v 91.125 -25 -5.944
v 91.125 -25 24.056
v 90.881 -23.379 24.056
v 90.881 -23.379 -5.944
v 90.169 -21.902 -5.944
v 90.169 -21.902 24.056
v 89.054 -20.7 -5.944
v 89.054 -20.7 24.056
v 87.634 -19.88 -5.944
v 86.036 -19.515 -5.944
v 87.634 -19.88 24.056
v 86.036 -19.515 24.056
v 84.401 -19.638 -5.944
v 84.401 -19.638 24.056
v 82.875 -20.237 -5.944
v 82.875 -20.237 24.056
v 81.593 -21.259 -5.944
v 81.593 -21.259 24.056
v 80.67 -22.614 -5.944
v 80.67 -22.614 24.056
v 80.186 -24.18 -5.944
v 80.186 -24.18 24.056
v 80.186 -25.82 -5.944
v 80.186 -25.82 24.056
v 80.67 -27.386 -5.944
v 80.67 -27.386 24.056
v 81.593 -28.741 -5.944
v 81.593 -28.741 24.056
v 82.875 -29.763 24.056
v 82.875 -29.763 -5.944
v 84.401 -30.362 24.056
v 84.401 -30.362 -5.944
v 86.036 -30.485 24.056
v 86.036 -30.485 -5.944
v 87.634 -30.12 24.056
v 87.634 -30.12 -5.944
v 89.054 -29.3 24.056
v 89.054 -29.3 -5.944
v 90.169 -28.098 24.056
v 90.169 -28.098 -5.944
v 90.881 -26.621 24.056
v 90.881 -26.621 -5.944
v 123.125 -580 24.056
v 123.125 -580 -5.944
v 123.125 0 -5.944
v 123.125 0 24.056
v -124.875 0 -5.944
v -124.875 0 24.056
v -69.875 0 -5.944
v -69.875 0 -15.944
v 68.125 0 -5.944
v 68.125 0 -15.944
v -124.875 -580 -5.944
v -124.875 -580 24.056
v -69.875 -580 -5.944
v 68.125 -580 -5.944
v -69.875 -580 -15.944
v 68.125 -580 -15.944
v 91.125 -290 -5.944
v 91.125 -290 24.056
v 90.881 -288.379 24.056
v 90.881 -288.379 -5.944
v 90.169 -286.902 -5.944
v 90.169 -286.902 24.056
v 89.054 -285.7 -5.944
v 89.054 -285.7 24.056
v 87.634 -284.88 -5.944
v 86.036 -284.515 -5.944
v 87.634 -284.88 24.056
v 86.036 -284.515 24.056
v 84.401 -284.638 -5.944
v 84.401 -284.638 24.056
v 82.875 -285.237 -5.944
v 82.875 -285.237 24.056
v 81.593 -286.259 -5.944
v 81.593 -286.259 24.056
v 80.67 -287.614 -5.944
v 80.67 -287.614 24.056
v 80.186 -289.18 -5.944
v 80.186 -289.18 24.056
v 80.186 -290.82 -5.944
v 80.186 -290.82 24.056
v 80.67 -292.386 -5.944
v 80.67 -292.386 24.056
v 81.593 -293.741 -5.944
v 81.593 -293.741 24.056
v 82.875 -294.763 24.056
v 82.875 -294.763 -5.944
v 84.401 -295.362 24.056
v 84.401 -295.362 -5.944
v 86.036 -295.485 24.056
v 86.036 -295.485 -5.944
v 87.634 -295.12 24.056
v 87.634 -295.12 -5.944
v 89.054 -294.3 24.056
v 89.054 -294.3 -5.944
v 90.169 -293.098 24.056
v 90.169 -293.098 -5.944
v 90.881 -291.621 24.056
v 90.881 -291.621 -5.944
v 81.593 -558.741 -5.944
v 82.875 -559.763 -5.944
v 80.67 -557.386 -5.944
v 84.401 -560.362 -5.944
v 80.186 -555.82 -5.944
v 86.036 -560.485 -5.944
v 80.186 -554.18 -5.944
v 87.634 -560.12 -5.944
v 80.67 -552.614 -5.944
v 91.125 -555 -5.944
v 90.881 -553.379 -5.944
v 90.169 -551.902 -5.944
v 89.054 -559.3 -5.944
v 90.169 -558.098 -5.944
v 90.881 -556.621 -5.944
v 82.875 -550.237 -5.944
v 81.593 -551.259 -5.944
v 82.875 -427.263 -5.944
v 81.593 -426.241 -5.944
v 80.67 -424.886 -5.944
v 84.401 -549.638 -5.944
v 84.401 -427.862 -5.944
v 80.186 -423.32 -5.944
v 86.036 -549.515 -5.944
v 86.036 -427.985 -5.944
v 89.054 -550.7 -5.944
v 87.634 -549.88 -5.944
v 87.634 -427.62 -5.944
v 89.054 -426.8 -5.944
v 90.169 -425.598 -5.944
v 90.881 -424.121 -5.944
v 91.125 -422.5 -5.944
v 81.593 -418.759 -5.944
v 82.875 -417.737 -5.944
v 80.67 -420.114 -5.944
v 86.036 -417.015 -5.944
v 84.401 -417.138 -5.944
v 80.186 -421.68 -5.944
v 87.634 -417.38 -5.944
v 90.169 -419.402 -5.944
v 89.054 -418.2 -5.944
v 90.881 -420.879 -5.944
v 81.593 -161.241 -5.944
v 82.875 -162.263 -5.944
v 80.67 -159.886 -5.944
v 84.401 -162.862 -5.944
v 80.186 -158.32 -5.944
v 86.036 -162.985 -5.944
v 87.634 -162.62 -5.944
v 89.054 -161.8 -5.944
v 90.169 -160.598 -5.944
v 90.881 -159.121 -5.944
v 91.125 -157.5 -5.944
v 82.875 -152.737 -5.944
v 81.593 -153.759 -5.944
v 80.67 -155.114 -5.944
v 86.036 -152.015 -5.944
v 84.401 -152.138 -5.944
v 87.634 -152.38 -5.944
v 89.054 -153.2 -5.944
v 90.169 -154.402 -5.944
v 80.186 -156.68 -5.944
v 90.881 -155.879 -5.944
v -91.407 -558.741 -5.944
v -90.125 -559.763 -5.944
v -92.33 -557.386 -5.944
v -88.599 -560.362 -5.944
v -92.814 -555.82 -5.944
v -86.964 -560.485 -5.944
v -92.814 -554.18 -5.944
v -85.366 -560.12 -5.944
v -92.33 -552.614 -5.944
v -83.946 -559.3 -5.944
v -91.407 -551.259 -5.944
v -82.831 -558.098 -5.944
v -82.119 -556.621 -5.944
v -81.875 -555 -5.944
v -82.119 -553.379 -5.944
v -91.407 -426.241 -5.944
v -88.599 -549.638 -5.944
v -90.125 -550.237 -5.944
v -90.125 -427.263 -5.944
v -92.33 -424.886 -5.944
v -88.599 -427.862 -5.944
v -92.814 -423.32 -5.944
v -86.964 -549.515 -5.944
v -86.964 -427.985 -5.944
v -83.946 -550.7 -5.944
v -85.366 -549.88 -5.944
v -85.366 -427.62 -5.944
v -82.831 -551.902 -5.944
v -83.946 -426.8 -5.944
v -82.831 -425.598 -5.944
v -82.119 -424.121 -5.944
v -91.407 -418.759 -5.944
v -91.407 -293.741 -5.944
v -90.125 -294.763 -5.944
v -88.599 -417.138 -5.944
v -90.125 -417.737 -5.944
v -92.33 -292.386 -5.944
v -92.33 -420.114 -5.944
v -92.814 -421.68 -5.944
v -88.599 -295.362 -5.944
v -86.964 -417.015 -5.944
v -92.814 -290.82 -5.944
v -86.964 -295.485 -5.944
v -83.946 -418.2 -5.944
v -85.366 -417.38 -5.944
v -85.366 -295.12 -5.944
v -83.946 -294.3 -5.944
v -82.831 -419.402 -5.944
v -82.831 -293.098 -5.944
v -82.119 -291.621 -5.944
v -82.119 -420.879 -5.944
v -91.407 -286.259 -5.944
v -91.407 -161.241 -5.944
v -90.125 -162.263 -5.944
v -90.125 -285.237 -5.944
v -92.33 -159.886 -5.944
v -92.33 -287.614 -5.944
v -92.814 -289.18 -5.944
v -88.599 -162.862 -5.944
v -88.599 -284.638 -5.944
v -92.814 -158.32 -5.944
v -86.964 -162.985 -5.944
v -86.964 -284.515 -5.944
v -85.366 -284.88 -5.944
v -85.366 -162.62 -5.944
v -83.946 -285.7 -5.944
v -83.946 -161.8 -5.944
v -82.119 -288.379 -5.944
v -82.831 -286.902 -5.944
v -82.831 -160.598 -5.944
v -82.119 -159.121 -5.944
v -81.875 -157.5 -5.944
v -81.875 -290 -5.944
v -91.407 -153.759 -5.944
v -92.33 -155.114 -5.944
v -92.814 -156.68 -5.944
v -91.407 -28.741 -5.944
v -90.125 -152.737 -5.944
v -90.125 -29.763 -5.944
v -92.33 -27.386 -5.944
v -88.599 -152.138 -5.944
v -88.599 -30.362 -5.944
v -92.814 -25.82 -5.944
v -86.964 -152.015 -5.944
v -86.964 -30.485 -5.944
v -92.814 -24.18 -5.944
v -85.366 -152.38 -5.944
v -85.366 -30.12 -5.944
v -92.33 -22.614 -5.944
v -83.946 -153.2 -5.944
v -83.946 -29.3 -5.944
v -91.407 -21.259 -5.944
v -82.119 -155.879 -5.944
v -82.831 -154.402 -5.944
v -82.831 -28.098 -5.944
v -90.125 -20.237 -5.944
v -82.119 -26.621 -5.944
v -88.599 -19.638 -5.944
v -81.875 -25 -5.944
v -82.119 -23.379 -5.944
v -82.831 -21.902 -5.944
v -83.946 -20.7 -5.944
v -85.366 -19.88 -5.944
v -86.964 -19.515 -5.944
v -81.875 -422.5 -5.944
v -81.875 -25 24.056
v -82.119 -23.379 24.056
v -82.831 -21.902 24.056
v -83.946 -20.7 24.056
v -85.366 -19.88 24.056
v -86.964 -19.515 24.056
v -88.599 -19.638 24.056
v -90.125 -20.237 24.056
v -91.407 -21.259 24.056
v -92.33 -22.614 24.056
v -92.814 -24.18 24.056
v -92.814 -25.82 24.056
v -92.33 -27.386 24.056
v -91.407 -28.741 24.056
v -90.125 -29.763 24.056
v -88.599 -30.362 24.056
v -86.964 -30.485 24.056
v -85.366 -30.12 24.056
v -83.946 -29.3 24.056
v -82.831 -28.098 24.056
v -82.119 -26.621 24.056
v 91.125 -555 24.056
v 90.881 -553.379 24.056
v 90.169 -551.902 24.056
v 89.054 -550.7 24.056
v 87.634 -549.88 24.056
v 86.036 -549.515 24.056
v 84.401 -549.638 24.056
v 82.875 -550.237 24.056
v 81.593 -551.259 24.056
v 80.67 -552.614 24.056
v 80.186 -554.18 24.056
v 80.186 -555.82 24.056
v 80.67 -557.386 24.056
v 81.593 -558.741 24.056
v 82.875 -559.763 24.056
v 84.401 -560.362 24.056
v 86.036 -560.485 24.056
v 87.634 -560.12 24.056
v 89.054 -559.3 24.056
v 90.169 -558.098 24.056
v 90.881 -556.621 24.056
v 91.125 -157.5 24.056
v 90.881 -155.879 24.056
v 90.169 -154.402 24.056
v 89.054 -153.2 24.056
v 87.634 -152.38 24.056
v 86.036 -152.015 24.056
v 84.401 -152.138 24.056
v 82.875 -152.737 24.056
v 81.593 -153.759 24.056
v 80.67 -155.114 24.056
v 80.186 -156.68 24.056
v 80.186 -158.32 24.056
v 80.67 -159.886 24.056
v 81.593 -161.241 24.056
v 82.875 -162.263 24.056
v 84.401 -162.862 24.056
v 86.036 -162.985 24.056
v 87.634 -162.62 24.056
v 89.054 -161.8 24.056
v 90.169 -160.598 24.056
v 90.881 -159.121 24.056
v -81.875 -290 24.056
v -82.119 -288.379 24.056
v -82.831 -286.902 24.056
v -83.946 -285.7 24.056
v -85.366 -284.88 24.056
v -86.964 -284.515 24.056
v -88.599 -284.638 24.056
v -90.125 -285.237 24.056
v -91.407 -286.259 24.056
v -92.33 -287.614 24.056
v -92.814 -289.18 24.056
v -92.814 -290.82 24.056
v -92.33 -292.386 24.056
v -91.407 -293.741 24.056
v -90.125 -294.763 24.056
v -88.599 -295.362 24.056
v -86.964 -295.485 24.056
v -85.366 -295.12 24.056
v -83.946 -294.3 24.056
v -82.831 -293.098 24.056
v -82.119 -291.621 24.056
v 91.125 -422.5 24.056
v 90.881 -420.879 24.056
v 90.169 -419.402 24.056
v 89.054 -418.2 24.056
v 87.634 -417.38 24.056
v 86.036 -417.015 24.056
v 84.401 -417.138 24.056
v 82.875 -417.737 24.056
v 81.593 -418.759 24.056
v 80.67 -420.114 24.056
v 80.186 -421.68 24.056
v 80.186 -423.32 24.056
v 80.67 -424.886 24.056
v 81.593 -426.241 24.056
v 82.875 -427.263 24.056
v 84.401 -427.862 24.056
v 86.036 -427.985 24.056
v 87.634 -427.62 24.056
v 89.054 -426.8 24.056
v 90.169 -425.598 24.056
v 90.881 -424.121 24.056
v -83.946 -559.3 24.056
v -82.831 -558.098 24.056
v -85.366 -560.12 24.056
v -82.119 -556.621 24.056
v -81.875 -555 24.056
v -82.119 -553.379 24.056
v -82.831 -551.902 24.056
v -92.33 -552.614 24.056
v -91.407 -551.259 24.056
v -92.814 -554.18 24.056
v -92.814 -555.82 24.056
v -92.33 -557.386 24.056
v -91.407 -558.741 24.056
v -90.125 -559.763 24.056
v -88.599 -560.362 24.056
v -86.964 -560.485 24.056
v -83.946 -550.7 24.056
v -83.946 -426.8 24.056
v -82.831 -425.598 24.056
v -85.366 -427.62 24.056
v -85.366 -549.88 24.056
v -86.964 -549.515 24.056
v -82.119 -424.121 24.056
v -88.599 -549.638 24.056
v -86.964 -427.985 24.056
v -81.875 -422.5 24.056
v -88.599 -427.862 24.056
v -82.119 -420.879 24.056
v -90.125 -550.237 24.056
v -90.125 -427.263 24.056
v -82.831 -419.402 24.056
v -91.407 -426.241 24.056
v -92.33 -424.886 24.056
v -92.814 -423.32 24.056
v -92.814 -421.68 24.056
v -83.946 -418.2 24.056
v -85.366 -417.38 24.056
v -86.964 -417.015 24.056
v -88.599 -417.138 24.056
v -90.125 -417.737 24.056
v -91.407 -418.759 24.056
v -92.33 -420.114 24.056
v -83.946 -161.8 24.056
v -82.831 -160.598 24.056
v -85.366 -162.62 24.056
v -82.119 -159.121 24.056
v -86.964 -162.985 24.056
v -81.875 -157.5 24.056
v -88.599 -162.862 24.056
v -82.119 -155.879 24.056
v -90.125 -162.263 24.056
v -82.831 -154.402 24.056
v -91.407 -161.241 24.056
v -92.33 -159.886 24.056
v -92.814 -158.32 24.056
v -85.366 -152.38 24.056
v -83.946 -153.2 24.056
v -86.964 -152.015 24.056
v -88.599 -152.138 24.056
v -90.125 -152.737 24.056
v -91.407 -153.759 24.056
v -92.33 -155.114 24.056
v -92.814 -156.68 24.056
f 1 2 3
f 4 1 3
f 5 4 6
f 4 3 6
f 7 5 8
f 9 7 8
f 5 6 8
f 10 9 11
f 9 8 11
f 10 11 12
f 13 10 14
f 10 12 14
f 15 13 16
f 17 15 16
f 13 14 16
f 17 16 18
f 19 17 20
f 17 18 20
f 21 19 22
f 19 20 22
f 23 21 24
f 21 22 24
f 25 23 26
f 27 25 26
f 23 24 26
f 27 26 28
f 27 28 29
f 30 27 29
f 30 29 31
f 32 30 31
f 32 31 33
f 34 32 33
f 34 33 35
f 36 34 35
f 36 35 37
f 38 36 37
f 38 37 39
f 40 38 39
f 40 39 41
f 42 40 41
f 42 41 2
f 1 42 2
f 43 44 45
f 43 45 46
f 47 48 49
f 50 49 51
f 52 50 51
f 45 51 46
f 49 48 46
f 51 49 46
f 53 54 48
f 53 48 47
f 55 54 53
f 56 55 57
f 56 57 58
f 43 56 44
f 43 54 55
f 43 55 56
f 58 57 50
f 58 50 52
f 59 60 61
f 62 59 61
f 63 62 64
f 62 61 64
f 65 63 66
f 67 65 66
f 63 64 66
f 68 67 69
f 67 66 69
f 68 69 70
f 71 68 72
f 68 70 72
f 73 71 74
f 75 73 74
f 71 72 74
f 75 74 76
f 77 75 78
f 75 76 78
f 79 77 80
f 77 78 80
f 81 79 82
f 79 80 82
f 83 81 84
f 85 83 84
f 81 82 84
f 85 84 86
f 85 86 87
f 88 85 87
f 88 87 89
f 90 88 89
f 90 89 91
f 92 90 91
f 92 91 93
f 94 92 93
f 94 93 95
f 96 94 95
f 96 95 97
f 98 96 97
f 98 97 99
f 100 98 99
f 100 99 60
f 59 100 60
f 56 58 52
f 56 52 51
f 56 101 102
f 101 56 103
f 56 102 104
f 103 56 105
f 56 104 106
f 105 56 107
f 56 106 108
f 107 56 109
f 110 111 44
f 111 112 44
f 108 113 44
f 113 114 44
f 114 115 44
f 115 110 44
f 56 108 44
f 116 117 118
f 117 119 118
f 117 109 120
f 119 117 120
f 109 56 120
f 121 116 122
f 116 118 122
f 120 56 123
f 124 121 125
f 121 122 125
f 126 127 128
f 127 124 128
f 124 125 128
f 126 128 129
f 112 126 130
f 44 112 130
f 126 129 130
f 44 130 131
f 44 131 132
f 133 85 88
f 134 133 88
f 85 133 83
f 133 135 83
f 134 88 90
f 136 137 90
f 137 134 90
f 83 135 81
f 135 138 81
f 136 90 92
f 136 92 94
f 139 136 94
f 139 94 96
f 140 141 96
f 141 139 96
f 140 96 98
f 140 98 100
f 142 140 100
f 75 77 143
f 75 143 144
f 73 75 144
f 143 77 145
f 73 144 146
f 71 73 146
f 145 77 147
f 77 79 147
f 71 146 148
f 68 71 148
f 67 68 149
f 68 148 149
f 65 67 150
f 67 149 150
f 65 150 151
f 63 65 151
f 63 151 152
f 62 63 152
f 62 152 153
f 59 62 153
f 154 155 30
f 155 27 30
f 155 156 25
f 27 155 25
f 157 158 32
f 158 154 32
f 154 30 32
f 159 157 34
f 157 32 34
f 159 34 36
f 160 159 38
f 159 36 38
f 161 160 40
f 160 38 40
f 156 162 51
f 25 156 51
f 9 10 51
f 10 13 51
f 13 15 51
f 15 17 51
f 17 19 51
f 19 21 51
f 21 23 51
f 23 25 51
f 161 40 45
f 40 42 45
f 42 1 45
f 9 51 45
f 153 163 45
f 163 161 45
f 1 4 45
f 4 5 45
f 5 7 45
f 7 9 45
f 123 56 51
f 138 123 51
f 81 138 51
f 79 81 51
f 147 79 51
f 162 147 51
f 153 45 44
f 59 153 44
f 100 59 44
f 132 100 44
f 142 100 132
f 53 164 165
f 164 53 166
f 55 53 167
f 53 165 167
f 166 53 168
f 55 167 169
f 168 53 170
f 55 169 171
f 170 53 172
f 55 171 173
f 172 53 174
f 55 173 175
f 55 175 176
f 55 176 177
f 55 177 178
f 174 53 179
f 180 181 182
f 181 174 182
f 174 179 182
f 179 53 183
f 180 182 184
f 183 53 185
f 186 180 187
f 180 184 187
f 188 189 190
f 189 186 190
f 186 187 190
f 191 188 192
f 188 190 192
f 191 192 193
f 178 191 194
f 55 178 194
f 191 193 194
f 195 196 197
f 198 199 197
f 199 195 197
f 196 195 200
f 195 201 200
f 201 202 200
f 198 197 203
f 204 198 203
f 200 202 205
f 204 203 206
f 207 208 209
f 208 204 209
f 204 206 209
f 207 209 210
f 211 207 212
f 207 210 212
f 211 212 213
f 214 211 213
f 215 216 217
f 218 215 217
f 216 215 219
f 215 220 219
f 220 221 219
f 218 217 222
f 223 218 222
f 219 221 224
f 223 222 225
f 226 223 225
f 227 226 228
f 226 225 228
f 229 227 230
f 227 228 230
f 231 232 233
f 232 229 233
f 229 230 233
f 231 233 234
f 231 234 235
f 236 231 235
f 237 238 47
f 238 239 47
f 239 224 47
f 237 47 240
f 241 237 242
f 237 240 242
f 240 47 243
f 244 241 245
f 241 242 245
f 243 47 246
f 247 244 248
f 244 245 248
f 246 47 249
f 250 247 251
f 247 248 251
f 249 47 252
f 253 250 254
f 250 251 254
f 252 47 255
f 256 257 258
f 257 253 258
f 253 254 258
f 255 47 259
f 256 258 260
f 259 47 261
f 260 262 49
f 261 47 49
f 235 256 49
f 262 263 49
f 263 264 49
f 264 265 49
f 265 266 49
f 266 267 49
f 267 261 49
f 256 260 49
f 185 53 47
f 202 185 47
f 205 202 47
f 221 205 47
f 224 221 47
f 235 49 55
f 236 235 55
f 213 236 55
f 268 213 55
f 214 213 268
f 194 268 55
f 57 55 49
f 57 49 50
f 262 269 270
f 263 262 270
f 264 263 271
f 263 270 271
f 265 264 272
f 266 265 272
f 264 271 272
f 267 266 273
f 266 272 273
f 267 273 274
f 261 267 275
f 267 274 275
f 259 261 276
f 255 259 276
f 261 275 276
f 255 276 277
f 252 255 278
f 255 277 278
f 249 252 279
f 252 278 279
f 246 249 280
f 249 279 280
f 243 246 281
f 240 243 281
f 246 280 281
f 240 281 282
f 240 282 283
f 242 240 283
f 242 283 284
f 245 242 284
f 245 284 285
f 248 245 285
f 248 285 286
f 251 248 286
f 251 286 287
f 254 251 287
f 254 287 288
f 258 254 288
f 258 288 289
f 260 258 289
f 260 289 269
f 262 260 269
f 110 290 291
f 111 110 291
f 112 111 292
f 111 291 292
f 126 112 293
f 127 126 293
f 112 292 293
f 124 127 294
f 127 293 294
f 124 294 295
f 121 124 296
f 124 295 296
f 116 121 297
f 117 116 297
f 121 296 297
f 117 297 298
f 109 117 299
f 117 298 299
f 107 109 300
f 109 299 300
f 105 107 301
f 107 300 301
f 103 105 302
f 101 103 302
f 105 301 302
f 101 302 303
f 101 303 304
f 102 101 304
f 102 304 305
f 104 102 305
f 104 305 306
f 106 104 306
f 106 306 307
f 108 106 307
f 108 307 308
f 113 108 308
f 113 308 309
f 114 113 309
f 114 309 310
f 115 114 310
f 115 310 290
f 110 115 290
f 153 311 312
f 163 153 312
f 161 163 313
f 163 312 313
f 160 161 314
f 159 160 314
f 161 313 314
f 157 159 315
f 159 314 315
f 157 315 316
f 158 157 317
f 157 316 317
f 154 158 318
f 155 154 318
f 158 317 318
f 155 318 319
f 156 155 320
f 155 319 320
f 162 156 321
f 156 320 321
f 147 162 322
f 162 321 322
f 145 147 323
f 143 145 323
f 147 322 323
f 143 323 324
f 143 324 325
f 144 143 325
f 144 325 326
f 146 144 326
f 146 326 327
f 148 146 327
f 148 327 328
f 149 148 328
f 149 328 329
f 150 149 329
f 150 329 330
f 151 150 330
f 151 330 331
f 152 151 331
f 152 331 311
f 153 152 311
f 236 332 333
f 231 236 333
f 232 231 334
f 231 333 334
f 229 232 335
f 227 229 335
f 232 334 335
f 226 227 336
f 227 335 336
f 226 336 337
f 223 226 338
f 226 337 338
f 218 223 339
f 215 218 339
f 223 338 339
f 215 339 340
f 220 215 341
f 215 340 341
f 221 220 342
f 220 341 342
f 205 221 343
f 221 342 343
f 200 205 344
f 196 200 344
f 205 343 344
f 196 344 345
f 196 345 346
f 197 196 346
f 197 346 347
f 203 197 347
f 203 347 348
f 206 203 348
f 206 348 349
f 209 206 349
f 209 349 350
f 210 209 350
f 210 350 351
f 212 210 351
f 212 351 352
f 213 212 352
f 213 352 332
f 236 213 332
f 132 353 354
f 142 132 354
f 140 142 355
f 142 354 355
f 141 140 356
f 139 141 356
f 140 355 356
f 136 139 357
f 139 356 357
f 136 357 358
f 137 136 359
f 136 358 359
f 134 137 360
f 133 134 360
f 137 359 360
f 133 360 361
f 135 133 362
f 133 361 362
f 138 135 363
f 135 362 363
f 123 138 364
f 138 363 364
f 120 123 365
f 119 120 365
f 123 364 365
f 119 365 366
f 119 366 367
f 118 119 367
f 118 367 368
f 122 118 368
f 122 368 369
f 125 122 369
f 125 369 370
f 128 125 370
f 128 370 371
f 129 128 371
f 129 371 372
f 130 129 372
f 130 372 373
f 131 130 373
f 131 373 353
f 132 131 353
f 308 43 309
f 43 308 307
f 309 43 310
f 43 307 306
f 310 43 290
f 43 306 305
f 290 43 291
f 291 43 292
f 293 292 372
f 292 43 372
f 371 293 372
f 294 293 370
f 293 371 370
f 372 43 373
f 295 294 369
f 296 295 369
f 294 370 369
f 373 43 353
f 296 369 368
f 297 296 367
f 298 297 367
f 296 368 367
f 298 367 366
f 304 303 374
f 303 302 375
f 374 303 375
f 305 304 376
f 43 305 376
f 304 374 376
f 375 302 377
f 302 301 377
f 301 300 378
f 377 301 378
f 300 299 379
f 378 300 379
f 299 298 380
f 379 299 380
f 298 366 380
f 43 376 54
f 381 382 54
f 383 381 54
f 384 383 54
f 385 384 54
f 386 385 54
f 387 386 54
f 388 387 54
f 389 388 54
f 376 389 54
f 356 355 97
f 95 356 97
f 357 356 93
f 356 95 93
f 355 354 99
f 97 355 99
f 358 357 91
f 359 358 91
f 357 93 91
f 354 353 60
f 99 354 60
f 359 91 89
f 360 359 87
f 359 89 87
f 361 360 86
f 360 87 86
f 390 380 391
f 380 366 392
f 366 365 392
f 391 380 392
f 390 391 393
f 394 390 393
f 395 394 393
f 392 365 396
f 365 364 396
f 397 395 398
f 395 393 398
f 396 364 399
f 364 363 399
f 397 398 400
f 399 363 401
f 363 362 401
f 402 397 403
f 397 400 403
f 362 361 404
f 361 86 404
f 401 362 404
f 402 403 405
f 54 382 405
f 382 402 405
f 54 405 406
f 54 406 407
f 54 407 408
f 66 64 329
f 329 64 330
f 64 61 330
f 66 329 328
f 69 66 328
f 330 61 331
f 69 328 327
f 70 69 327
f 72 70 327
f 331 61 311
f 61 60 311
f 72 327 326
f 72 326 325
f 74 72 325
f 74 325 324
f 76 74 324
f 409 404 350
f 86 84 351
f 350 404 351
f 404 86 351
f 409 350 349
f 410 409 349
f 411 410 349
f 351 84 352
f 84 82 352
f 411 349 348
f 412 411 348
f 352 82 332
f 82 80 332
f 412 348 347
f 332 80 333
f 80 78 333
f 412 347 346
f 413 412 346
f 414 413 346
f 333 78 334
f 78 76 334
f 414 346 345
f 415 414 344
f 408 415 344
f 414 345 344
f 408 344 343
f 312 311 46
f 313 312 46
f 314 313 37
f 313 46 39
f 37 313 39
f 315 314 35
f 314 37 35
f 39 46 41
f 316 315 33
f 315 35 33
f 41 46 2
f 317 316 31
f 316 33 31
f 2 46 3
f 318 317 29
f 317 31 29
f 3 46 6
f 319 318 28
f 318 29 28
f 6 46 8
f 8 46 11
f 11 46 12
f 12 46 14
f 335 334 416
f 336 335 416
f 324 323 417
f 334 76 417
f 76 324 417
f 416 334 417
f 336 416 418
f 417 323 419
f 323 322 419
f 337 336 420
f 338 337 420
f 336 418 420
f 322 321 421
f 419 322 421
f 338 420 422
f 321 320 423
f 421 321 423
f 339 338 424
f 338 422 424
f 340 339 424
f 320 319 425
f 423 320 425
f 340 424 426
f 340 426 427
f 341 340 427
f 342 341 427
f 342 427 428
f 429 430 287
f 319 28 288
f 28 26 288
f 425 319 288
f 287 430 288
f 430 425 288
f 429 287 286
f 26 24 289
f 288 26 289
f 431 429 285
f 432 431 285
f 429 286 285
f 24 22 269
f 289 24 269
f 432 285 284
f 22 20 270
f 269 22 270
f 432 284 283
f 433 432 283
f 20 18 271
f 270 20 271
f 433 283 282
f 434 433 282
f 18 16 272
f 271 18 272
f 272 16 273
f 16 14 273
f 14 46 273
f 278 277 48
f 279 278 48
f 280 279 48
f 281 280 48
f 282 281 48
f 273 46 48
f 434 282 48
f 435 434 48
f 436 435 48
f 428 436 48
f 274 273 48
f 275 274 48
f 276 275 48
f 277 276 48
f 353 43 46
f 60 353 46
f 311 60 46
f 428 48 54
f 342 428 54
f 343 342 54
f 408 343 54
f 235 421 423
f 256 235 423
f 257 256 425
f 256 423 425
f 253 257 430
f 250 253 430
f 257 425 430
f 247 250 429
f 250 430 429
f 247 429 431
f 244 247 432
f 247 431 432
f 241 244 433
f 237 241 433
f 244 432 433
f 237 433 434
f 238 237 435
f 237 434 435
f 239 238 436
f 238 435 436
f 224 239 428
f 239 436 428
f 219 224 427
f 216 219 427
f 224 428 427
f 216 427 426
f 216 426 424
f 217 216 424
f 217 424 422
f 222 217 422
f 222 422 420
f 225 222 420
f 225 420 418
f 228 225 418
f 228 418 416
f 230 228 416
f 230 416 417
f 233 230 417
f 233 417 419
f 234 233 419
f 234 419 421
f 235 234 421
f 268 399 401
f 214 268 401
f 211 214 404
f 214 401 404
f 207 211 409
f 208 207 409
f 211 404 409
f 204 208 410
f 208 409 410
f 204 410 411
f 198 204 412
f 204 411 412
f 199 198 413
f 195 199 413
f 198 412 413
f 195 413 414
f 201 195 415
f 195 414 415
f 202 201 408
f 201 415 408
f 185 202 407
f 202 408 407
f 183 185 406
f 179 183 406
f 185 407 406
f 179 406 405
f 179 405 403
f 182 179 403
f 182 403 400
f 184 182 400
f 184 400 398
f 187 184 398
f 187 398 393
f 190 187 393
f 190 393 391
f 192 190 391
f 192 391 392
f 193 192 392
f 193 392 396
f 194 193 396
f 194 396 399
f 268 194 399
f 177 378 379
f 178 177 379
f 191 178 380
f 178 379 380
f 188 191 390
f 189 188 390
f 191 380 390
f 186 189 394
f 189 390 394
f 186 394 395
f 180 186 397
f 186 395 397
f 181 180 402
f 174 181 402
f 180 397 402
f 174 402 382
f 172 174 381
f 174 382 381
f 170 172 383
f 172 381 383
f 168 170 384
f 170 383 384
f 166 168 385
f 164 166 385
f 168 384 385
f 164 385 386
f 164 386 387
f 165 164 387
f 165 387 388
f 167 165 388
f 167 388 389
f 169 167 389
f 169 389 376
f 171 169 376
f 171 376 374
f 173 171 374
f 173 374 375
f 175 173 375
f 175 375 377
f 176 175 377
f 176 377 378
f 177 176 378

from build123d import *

# Parameters (mm, degrees)
F1_DEPTH = 580
F2_R     = 5.5
F3_DEPTH = 40.001


with BuildPart() as f1:
    # F0 (on Front) → F1 (new body)
    with BuildSketch(Plane.XZ):
        Polygon((123.124914, 24.05611), (-124.875086, 24.05611), (-124.875086, -5.94389), (-69.875086, -5.94389), (-69.875086, -15.94389), (68.124914, -15.94389), (68.124914, -5.94389), (123.124914, -5.94389), align=None)
    extrude(amount=F1_DEPTH)

    # F2 (on face) → F3 (cut, through all)
    with BuildSketch(Plane.XY.offset(24.05611)):
        with Locations((-87.375086, -25)):
            Circle(F2_R)
        with Locations((85.624914, -25)):
            Circle(F2_R)
        with Locations((-87.375086, -157.5)):
            Circle(F2_R)
        with Locations((85.624914, -157.5)):
            Circle(F2_R)
        with Locations((-87.375086, -290)):
            Circle(F2_R)
        with Locations((85.624914, -290)):
            Circle(F2_R)
        with Locations((-87.375086, -422.5)):
            Circle(F2_R)
        with Locations((85.624914, -422.5)):
            Circle(F2_R)
        with Locations((85.624914, -555)):
            Circle(F2_R)
        with Locations((-87.375086, -555)):
            Circle(F2_R)
    extrude(amount=-F3_DEPTH, mode=Mode.SUBTRACT)


solid = f1.part
